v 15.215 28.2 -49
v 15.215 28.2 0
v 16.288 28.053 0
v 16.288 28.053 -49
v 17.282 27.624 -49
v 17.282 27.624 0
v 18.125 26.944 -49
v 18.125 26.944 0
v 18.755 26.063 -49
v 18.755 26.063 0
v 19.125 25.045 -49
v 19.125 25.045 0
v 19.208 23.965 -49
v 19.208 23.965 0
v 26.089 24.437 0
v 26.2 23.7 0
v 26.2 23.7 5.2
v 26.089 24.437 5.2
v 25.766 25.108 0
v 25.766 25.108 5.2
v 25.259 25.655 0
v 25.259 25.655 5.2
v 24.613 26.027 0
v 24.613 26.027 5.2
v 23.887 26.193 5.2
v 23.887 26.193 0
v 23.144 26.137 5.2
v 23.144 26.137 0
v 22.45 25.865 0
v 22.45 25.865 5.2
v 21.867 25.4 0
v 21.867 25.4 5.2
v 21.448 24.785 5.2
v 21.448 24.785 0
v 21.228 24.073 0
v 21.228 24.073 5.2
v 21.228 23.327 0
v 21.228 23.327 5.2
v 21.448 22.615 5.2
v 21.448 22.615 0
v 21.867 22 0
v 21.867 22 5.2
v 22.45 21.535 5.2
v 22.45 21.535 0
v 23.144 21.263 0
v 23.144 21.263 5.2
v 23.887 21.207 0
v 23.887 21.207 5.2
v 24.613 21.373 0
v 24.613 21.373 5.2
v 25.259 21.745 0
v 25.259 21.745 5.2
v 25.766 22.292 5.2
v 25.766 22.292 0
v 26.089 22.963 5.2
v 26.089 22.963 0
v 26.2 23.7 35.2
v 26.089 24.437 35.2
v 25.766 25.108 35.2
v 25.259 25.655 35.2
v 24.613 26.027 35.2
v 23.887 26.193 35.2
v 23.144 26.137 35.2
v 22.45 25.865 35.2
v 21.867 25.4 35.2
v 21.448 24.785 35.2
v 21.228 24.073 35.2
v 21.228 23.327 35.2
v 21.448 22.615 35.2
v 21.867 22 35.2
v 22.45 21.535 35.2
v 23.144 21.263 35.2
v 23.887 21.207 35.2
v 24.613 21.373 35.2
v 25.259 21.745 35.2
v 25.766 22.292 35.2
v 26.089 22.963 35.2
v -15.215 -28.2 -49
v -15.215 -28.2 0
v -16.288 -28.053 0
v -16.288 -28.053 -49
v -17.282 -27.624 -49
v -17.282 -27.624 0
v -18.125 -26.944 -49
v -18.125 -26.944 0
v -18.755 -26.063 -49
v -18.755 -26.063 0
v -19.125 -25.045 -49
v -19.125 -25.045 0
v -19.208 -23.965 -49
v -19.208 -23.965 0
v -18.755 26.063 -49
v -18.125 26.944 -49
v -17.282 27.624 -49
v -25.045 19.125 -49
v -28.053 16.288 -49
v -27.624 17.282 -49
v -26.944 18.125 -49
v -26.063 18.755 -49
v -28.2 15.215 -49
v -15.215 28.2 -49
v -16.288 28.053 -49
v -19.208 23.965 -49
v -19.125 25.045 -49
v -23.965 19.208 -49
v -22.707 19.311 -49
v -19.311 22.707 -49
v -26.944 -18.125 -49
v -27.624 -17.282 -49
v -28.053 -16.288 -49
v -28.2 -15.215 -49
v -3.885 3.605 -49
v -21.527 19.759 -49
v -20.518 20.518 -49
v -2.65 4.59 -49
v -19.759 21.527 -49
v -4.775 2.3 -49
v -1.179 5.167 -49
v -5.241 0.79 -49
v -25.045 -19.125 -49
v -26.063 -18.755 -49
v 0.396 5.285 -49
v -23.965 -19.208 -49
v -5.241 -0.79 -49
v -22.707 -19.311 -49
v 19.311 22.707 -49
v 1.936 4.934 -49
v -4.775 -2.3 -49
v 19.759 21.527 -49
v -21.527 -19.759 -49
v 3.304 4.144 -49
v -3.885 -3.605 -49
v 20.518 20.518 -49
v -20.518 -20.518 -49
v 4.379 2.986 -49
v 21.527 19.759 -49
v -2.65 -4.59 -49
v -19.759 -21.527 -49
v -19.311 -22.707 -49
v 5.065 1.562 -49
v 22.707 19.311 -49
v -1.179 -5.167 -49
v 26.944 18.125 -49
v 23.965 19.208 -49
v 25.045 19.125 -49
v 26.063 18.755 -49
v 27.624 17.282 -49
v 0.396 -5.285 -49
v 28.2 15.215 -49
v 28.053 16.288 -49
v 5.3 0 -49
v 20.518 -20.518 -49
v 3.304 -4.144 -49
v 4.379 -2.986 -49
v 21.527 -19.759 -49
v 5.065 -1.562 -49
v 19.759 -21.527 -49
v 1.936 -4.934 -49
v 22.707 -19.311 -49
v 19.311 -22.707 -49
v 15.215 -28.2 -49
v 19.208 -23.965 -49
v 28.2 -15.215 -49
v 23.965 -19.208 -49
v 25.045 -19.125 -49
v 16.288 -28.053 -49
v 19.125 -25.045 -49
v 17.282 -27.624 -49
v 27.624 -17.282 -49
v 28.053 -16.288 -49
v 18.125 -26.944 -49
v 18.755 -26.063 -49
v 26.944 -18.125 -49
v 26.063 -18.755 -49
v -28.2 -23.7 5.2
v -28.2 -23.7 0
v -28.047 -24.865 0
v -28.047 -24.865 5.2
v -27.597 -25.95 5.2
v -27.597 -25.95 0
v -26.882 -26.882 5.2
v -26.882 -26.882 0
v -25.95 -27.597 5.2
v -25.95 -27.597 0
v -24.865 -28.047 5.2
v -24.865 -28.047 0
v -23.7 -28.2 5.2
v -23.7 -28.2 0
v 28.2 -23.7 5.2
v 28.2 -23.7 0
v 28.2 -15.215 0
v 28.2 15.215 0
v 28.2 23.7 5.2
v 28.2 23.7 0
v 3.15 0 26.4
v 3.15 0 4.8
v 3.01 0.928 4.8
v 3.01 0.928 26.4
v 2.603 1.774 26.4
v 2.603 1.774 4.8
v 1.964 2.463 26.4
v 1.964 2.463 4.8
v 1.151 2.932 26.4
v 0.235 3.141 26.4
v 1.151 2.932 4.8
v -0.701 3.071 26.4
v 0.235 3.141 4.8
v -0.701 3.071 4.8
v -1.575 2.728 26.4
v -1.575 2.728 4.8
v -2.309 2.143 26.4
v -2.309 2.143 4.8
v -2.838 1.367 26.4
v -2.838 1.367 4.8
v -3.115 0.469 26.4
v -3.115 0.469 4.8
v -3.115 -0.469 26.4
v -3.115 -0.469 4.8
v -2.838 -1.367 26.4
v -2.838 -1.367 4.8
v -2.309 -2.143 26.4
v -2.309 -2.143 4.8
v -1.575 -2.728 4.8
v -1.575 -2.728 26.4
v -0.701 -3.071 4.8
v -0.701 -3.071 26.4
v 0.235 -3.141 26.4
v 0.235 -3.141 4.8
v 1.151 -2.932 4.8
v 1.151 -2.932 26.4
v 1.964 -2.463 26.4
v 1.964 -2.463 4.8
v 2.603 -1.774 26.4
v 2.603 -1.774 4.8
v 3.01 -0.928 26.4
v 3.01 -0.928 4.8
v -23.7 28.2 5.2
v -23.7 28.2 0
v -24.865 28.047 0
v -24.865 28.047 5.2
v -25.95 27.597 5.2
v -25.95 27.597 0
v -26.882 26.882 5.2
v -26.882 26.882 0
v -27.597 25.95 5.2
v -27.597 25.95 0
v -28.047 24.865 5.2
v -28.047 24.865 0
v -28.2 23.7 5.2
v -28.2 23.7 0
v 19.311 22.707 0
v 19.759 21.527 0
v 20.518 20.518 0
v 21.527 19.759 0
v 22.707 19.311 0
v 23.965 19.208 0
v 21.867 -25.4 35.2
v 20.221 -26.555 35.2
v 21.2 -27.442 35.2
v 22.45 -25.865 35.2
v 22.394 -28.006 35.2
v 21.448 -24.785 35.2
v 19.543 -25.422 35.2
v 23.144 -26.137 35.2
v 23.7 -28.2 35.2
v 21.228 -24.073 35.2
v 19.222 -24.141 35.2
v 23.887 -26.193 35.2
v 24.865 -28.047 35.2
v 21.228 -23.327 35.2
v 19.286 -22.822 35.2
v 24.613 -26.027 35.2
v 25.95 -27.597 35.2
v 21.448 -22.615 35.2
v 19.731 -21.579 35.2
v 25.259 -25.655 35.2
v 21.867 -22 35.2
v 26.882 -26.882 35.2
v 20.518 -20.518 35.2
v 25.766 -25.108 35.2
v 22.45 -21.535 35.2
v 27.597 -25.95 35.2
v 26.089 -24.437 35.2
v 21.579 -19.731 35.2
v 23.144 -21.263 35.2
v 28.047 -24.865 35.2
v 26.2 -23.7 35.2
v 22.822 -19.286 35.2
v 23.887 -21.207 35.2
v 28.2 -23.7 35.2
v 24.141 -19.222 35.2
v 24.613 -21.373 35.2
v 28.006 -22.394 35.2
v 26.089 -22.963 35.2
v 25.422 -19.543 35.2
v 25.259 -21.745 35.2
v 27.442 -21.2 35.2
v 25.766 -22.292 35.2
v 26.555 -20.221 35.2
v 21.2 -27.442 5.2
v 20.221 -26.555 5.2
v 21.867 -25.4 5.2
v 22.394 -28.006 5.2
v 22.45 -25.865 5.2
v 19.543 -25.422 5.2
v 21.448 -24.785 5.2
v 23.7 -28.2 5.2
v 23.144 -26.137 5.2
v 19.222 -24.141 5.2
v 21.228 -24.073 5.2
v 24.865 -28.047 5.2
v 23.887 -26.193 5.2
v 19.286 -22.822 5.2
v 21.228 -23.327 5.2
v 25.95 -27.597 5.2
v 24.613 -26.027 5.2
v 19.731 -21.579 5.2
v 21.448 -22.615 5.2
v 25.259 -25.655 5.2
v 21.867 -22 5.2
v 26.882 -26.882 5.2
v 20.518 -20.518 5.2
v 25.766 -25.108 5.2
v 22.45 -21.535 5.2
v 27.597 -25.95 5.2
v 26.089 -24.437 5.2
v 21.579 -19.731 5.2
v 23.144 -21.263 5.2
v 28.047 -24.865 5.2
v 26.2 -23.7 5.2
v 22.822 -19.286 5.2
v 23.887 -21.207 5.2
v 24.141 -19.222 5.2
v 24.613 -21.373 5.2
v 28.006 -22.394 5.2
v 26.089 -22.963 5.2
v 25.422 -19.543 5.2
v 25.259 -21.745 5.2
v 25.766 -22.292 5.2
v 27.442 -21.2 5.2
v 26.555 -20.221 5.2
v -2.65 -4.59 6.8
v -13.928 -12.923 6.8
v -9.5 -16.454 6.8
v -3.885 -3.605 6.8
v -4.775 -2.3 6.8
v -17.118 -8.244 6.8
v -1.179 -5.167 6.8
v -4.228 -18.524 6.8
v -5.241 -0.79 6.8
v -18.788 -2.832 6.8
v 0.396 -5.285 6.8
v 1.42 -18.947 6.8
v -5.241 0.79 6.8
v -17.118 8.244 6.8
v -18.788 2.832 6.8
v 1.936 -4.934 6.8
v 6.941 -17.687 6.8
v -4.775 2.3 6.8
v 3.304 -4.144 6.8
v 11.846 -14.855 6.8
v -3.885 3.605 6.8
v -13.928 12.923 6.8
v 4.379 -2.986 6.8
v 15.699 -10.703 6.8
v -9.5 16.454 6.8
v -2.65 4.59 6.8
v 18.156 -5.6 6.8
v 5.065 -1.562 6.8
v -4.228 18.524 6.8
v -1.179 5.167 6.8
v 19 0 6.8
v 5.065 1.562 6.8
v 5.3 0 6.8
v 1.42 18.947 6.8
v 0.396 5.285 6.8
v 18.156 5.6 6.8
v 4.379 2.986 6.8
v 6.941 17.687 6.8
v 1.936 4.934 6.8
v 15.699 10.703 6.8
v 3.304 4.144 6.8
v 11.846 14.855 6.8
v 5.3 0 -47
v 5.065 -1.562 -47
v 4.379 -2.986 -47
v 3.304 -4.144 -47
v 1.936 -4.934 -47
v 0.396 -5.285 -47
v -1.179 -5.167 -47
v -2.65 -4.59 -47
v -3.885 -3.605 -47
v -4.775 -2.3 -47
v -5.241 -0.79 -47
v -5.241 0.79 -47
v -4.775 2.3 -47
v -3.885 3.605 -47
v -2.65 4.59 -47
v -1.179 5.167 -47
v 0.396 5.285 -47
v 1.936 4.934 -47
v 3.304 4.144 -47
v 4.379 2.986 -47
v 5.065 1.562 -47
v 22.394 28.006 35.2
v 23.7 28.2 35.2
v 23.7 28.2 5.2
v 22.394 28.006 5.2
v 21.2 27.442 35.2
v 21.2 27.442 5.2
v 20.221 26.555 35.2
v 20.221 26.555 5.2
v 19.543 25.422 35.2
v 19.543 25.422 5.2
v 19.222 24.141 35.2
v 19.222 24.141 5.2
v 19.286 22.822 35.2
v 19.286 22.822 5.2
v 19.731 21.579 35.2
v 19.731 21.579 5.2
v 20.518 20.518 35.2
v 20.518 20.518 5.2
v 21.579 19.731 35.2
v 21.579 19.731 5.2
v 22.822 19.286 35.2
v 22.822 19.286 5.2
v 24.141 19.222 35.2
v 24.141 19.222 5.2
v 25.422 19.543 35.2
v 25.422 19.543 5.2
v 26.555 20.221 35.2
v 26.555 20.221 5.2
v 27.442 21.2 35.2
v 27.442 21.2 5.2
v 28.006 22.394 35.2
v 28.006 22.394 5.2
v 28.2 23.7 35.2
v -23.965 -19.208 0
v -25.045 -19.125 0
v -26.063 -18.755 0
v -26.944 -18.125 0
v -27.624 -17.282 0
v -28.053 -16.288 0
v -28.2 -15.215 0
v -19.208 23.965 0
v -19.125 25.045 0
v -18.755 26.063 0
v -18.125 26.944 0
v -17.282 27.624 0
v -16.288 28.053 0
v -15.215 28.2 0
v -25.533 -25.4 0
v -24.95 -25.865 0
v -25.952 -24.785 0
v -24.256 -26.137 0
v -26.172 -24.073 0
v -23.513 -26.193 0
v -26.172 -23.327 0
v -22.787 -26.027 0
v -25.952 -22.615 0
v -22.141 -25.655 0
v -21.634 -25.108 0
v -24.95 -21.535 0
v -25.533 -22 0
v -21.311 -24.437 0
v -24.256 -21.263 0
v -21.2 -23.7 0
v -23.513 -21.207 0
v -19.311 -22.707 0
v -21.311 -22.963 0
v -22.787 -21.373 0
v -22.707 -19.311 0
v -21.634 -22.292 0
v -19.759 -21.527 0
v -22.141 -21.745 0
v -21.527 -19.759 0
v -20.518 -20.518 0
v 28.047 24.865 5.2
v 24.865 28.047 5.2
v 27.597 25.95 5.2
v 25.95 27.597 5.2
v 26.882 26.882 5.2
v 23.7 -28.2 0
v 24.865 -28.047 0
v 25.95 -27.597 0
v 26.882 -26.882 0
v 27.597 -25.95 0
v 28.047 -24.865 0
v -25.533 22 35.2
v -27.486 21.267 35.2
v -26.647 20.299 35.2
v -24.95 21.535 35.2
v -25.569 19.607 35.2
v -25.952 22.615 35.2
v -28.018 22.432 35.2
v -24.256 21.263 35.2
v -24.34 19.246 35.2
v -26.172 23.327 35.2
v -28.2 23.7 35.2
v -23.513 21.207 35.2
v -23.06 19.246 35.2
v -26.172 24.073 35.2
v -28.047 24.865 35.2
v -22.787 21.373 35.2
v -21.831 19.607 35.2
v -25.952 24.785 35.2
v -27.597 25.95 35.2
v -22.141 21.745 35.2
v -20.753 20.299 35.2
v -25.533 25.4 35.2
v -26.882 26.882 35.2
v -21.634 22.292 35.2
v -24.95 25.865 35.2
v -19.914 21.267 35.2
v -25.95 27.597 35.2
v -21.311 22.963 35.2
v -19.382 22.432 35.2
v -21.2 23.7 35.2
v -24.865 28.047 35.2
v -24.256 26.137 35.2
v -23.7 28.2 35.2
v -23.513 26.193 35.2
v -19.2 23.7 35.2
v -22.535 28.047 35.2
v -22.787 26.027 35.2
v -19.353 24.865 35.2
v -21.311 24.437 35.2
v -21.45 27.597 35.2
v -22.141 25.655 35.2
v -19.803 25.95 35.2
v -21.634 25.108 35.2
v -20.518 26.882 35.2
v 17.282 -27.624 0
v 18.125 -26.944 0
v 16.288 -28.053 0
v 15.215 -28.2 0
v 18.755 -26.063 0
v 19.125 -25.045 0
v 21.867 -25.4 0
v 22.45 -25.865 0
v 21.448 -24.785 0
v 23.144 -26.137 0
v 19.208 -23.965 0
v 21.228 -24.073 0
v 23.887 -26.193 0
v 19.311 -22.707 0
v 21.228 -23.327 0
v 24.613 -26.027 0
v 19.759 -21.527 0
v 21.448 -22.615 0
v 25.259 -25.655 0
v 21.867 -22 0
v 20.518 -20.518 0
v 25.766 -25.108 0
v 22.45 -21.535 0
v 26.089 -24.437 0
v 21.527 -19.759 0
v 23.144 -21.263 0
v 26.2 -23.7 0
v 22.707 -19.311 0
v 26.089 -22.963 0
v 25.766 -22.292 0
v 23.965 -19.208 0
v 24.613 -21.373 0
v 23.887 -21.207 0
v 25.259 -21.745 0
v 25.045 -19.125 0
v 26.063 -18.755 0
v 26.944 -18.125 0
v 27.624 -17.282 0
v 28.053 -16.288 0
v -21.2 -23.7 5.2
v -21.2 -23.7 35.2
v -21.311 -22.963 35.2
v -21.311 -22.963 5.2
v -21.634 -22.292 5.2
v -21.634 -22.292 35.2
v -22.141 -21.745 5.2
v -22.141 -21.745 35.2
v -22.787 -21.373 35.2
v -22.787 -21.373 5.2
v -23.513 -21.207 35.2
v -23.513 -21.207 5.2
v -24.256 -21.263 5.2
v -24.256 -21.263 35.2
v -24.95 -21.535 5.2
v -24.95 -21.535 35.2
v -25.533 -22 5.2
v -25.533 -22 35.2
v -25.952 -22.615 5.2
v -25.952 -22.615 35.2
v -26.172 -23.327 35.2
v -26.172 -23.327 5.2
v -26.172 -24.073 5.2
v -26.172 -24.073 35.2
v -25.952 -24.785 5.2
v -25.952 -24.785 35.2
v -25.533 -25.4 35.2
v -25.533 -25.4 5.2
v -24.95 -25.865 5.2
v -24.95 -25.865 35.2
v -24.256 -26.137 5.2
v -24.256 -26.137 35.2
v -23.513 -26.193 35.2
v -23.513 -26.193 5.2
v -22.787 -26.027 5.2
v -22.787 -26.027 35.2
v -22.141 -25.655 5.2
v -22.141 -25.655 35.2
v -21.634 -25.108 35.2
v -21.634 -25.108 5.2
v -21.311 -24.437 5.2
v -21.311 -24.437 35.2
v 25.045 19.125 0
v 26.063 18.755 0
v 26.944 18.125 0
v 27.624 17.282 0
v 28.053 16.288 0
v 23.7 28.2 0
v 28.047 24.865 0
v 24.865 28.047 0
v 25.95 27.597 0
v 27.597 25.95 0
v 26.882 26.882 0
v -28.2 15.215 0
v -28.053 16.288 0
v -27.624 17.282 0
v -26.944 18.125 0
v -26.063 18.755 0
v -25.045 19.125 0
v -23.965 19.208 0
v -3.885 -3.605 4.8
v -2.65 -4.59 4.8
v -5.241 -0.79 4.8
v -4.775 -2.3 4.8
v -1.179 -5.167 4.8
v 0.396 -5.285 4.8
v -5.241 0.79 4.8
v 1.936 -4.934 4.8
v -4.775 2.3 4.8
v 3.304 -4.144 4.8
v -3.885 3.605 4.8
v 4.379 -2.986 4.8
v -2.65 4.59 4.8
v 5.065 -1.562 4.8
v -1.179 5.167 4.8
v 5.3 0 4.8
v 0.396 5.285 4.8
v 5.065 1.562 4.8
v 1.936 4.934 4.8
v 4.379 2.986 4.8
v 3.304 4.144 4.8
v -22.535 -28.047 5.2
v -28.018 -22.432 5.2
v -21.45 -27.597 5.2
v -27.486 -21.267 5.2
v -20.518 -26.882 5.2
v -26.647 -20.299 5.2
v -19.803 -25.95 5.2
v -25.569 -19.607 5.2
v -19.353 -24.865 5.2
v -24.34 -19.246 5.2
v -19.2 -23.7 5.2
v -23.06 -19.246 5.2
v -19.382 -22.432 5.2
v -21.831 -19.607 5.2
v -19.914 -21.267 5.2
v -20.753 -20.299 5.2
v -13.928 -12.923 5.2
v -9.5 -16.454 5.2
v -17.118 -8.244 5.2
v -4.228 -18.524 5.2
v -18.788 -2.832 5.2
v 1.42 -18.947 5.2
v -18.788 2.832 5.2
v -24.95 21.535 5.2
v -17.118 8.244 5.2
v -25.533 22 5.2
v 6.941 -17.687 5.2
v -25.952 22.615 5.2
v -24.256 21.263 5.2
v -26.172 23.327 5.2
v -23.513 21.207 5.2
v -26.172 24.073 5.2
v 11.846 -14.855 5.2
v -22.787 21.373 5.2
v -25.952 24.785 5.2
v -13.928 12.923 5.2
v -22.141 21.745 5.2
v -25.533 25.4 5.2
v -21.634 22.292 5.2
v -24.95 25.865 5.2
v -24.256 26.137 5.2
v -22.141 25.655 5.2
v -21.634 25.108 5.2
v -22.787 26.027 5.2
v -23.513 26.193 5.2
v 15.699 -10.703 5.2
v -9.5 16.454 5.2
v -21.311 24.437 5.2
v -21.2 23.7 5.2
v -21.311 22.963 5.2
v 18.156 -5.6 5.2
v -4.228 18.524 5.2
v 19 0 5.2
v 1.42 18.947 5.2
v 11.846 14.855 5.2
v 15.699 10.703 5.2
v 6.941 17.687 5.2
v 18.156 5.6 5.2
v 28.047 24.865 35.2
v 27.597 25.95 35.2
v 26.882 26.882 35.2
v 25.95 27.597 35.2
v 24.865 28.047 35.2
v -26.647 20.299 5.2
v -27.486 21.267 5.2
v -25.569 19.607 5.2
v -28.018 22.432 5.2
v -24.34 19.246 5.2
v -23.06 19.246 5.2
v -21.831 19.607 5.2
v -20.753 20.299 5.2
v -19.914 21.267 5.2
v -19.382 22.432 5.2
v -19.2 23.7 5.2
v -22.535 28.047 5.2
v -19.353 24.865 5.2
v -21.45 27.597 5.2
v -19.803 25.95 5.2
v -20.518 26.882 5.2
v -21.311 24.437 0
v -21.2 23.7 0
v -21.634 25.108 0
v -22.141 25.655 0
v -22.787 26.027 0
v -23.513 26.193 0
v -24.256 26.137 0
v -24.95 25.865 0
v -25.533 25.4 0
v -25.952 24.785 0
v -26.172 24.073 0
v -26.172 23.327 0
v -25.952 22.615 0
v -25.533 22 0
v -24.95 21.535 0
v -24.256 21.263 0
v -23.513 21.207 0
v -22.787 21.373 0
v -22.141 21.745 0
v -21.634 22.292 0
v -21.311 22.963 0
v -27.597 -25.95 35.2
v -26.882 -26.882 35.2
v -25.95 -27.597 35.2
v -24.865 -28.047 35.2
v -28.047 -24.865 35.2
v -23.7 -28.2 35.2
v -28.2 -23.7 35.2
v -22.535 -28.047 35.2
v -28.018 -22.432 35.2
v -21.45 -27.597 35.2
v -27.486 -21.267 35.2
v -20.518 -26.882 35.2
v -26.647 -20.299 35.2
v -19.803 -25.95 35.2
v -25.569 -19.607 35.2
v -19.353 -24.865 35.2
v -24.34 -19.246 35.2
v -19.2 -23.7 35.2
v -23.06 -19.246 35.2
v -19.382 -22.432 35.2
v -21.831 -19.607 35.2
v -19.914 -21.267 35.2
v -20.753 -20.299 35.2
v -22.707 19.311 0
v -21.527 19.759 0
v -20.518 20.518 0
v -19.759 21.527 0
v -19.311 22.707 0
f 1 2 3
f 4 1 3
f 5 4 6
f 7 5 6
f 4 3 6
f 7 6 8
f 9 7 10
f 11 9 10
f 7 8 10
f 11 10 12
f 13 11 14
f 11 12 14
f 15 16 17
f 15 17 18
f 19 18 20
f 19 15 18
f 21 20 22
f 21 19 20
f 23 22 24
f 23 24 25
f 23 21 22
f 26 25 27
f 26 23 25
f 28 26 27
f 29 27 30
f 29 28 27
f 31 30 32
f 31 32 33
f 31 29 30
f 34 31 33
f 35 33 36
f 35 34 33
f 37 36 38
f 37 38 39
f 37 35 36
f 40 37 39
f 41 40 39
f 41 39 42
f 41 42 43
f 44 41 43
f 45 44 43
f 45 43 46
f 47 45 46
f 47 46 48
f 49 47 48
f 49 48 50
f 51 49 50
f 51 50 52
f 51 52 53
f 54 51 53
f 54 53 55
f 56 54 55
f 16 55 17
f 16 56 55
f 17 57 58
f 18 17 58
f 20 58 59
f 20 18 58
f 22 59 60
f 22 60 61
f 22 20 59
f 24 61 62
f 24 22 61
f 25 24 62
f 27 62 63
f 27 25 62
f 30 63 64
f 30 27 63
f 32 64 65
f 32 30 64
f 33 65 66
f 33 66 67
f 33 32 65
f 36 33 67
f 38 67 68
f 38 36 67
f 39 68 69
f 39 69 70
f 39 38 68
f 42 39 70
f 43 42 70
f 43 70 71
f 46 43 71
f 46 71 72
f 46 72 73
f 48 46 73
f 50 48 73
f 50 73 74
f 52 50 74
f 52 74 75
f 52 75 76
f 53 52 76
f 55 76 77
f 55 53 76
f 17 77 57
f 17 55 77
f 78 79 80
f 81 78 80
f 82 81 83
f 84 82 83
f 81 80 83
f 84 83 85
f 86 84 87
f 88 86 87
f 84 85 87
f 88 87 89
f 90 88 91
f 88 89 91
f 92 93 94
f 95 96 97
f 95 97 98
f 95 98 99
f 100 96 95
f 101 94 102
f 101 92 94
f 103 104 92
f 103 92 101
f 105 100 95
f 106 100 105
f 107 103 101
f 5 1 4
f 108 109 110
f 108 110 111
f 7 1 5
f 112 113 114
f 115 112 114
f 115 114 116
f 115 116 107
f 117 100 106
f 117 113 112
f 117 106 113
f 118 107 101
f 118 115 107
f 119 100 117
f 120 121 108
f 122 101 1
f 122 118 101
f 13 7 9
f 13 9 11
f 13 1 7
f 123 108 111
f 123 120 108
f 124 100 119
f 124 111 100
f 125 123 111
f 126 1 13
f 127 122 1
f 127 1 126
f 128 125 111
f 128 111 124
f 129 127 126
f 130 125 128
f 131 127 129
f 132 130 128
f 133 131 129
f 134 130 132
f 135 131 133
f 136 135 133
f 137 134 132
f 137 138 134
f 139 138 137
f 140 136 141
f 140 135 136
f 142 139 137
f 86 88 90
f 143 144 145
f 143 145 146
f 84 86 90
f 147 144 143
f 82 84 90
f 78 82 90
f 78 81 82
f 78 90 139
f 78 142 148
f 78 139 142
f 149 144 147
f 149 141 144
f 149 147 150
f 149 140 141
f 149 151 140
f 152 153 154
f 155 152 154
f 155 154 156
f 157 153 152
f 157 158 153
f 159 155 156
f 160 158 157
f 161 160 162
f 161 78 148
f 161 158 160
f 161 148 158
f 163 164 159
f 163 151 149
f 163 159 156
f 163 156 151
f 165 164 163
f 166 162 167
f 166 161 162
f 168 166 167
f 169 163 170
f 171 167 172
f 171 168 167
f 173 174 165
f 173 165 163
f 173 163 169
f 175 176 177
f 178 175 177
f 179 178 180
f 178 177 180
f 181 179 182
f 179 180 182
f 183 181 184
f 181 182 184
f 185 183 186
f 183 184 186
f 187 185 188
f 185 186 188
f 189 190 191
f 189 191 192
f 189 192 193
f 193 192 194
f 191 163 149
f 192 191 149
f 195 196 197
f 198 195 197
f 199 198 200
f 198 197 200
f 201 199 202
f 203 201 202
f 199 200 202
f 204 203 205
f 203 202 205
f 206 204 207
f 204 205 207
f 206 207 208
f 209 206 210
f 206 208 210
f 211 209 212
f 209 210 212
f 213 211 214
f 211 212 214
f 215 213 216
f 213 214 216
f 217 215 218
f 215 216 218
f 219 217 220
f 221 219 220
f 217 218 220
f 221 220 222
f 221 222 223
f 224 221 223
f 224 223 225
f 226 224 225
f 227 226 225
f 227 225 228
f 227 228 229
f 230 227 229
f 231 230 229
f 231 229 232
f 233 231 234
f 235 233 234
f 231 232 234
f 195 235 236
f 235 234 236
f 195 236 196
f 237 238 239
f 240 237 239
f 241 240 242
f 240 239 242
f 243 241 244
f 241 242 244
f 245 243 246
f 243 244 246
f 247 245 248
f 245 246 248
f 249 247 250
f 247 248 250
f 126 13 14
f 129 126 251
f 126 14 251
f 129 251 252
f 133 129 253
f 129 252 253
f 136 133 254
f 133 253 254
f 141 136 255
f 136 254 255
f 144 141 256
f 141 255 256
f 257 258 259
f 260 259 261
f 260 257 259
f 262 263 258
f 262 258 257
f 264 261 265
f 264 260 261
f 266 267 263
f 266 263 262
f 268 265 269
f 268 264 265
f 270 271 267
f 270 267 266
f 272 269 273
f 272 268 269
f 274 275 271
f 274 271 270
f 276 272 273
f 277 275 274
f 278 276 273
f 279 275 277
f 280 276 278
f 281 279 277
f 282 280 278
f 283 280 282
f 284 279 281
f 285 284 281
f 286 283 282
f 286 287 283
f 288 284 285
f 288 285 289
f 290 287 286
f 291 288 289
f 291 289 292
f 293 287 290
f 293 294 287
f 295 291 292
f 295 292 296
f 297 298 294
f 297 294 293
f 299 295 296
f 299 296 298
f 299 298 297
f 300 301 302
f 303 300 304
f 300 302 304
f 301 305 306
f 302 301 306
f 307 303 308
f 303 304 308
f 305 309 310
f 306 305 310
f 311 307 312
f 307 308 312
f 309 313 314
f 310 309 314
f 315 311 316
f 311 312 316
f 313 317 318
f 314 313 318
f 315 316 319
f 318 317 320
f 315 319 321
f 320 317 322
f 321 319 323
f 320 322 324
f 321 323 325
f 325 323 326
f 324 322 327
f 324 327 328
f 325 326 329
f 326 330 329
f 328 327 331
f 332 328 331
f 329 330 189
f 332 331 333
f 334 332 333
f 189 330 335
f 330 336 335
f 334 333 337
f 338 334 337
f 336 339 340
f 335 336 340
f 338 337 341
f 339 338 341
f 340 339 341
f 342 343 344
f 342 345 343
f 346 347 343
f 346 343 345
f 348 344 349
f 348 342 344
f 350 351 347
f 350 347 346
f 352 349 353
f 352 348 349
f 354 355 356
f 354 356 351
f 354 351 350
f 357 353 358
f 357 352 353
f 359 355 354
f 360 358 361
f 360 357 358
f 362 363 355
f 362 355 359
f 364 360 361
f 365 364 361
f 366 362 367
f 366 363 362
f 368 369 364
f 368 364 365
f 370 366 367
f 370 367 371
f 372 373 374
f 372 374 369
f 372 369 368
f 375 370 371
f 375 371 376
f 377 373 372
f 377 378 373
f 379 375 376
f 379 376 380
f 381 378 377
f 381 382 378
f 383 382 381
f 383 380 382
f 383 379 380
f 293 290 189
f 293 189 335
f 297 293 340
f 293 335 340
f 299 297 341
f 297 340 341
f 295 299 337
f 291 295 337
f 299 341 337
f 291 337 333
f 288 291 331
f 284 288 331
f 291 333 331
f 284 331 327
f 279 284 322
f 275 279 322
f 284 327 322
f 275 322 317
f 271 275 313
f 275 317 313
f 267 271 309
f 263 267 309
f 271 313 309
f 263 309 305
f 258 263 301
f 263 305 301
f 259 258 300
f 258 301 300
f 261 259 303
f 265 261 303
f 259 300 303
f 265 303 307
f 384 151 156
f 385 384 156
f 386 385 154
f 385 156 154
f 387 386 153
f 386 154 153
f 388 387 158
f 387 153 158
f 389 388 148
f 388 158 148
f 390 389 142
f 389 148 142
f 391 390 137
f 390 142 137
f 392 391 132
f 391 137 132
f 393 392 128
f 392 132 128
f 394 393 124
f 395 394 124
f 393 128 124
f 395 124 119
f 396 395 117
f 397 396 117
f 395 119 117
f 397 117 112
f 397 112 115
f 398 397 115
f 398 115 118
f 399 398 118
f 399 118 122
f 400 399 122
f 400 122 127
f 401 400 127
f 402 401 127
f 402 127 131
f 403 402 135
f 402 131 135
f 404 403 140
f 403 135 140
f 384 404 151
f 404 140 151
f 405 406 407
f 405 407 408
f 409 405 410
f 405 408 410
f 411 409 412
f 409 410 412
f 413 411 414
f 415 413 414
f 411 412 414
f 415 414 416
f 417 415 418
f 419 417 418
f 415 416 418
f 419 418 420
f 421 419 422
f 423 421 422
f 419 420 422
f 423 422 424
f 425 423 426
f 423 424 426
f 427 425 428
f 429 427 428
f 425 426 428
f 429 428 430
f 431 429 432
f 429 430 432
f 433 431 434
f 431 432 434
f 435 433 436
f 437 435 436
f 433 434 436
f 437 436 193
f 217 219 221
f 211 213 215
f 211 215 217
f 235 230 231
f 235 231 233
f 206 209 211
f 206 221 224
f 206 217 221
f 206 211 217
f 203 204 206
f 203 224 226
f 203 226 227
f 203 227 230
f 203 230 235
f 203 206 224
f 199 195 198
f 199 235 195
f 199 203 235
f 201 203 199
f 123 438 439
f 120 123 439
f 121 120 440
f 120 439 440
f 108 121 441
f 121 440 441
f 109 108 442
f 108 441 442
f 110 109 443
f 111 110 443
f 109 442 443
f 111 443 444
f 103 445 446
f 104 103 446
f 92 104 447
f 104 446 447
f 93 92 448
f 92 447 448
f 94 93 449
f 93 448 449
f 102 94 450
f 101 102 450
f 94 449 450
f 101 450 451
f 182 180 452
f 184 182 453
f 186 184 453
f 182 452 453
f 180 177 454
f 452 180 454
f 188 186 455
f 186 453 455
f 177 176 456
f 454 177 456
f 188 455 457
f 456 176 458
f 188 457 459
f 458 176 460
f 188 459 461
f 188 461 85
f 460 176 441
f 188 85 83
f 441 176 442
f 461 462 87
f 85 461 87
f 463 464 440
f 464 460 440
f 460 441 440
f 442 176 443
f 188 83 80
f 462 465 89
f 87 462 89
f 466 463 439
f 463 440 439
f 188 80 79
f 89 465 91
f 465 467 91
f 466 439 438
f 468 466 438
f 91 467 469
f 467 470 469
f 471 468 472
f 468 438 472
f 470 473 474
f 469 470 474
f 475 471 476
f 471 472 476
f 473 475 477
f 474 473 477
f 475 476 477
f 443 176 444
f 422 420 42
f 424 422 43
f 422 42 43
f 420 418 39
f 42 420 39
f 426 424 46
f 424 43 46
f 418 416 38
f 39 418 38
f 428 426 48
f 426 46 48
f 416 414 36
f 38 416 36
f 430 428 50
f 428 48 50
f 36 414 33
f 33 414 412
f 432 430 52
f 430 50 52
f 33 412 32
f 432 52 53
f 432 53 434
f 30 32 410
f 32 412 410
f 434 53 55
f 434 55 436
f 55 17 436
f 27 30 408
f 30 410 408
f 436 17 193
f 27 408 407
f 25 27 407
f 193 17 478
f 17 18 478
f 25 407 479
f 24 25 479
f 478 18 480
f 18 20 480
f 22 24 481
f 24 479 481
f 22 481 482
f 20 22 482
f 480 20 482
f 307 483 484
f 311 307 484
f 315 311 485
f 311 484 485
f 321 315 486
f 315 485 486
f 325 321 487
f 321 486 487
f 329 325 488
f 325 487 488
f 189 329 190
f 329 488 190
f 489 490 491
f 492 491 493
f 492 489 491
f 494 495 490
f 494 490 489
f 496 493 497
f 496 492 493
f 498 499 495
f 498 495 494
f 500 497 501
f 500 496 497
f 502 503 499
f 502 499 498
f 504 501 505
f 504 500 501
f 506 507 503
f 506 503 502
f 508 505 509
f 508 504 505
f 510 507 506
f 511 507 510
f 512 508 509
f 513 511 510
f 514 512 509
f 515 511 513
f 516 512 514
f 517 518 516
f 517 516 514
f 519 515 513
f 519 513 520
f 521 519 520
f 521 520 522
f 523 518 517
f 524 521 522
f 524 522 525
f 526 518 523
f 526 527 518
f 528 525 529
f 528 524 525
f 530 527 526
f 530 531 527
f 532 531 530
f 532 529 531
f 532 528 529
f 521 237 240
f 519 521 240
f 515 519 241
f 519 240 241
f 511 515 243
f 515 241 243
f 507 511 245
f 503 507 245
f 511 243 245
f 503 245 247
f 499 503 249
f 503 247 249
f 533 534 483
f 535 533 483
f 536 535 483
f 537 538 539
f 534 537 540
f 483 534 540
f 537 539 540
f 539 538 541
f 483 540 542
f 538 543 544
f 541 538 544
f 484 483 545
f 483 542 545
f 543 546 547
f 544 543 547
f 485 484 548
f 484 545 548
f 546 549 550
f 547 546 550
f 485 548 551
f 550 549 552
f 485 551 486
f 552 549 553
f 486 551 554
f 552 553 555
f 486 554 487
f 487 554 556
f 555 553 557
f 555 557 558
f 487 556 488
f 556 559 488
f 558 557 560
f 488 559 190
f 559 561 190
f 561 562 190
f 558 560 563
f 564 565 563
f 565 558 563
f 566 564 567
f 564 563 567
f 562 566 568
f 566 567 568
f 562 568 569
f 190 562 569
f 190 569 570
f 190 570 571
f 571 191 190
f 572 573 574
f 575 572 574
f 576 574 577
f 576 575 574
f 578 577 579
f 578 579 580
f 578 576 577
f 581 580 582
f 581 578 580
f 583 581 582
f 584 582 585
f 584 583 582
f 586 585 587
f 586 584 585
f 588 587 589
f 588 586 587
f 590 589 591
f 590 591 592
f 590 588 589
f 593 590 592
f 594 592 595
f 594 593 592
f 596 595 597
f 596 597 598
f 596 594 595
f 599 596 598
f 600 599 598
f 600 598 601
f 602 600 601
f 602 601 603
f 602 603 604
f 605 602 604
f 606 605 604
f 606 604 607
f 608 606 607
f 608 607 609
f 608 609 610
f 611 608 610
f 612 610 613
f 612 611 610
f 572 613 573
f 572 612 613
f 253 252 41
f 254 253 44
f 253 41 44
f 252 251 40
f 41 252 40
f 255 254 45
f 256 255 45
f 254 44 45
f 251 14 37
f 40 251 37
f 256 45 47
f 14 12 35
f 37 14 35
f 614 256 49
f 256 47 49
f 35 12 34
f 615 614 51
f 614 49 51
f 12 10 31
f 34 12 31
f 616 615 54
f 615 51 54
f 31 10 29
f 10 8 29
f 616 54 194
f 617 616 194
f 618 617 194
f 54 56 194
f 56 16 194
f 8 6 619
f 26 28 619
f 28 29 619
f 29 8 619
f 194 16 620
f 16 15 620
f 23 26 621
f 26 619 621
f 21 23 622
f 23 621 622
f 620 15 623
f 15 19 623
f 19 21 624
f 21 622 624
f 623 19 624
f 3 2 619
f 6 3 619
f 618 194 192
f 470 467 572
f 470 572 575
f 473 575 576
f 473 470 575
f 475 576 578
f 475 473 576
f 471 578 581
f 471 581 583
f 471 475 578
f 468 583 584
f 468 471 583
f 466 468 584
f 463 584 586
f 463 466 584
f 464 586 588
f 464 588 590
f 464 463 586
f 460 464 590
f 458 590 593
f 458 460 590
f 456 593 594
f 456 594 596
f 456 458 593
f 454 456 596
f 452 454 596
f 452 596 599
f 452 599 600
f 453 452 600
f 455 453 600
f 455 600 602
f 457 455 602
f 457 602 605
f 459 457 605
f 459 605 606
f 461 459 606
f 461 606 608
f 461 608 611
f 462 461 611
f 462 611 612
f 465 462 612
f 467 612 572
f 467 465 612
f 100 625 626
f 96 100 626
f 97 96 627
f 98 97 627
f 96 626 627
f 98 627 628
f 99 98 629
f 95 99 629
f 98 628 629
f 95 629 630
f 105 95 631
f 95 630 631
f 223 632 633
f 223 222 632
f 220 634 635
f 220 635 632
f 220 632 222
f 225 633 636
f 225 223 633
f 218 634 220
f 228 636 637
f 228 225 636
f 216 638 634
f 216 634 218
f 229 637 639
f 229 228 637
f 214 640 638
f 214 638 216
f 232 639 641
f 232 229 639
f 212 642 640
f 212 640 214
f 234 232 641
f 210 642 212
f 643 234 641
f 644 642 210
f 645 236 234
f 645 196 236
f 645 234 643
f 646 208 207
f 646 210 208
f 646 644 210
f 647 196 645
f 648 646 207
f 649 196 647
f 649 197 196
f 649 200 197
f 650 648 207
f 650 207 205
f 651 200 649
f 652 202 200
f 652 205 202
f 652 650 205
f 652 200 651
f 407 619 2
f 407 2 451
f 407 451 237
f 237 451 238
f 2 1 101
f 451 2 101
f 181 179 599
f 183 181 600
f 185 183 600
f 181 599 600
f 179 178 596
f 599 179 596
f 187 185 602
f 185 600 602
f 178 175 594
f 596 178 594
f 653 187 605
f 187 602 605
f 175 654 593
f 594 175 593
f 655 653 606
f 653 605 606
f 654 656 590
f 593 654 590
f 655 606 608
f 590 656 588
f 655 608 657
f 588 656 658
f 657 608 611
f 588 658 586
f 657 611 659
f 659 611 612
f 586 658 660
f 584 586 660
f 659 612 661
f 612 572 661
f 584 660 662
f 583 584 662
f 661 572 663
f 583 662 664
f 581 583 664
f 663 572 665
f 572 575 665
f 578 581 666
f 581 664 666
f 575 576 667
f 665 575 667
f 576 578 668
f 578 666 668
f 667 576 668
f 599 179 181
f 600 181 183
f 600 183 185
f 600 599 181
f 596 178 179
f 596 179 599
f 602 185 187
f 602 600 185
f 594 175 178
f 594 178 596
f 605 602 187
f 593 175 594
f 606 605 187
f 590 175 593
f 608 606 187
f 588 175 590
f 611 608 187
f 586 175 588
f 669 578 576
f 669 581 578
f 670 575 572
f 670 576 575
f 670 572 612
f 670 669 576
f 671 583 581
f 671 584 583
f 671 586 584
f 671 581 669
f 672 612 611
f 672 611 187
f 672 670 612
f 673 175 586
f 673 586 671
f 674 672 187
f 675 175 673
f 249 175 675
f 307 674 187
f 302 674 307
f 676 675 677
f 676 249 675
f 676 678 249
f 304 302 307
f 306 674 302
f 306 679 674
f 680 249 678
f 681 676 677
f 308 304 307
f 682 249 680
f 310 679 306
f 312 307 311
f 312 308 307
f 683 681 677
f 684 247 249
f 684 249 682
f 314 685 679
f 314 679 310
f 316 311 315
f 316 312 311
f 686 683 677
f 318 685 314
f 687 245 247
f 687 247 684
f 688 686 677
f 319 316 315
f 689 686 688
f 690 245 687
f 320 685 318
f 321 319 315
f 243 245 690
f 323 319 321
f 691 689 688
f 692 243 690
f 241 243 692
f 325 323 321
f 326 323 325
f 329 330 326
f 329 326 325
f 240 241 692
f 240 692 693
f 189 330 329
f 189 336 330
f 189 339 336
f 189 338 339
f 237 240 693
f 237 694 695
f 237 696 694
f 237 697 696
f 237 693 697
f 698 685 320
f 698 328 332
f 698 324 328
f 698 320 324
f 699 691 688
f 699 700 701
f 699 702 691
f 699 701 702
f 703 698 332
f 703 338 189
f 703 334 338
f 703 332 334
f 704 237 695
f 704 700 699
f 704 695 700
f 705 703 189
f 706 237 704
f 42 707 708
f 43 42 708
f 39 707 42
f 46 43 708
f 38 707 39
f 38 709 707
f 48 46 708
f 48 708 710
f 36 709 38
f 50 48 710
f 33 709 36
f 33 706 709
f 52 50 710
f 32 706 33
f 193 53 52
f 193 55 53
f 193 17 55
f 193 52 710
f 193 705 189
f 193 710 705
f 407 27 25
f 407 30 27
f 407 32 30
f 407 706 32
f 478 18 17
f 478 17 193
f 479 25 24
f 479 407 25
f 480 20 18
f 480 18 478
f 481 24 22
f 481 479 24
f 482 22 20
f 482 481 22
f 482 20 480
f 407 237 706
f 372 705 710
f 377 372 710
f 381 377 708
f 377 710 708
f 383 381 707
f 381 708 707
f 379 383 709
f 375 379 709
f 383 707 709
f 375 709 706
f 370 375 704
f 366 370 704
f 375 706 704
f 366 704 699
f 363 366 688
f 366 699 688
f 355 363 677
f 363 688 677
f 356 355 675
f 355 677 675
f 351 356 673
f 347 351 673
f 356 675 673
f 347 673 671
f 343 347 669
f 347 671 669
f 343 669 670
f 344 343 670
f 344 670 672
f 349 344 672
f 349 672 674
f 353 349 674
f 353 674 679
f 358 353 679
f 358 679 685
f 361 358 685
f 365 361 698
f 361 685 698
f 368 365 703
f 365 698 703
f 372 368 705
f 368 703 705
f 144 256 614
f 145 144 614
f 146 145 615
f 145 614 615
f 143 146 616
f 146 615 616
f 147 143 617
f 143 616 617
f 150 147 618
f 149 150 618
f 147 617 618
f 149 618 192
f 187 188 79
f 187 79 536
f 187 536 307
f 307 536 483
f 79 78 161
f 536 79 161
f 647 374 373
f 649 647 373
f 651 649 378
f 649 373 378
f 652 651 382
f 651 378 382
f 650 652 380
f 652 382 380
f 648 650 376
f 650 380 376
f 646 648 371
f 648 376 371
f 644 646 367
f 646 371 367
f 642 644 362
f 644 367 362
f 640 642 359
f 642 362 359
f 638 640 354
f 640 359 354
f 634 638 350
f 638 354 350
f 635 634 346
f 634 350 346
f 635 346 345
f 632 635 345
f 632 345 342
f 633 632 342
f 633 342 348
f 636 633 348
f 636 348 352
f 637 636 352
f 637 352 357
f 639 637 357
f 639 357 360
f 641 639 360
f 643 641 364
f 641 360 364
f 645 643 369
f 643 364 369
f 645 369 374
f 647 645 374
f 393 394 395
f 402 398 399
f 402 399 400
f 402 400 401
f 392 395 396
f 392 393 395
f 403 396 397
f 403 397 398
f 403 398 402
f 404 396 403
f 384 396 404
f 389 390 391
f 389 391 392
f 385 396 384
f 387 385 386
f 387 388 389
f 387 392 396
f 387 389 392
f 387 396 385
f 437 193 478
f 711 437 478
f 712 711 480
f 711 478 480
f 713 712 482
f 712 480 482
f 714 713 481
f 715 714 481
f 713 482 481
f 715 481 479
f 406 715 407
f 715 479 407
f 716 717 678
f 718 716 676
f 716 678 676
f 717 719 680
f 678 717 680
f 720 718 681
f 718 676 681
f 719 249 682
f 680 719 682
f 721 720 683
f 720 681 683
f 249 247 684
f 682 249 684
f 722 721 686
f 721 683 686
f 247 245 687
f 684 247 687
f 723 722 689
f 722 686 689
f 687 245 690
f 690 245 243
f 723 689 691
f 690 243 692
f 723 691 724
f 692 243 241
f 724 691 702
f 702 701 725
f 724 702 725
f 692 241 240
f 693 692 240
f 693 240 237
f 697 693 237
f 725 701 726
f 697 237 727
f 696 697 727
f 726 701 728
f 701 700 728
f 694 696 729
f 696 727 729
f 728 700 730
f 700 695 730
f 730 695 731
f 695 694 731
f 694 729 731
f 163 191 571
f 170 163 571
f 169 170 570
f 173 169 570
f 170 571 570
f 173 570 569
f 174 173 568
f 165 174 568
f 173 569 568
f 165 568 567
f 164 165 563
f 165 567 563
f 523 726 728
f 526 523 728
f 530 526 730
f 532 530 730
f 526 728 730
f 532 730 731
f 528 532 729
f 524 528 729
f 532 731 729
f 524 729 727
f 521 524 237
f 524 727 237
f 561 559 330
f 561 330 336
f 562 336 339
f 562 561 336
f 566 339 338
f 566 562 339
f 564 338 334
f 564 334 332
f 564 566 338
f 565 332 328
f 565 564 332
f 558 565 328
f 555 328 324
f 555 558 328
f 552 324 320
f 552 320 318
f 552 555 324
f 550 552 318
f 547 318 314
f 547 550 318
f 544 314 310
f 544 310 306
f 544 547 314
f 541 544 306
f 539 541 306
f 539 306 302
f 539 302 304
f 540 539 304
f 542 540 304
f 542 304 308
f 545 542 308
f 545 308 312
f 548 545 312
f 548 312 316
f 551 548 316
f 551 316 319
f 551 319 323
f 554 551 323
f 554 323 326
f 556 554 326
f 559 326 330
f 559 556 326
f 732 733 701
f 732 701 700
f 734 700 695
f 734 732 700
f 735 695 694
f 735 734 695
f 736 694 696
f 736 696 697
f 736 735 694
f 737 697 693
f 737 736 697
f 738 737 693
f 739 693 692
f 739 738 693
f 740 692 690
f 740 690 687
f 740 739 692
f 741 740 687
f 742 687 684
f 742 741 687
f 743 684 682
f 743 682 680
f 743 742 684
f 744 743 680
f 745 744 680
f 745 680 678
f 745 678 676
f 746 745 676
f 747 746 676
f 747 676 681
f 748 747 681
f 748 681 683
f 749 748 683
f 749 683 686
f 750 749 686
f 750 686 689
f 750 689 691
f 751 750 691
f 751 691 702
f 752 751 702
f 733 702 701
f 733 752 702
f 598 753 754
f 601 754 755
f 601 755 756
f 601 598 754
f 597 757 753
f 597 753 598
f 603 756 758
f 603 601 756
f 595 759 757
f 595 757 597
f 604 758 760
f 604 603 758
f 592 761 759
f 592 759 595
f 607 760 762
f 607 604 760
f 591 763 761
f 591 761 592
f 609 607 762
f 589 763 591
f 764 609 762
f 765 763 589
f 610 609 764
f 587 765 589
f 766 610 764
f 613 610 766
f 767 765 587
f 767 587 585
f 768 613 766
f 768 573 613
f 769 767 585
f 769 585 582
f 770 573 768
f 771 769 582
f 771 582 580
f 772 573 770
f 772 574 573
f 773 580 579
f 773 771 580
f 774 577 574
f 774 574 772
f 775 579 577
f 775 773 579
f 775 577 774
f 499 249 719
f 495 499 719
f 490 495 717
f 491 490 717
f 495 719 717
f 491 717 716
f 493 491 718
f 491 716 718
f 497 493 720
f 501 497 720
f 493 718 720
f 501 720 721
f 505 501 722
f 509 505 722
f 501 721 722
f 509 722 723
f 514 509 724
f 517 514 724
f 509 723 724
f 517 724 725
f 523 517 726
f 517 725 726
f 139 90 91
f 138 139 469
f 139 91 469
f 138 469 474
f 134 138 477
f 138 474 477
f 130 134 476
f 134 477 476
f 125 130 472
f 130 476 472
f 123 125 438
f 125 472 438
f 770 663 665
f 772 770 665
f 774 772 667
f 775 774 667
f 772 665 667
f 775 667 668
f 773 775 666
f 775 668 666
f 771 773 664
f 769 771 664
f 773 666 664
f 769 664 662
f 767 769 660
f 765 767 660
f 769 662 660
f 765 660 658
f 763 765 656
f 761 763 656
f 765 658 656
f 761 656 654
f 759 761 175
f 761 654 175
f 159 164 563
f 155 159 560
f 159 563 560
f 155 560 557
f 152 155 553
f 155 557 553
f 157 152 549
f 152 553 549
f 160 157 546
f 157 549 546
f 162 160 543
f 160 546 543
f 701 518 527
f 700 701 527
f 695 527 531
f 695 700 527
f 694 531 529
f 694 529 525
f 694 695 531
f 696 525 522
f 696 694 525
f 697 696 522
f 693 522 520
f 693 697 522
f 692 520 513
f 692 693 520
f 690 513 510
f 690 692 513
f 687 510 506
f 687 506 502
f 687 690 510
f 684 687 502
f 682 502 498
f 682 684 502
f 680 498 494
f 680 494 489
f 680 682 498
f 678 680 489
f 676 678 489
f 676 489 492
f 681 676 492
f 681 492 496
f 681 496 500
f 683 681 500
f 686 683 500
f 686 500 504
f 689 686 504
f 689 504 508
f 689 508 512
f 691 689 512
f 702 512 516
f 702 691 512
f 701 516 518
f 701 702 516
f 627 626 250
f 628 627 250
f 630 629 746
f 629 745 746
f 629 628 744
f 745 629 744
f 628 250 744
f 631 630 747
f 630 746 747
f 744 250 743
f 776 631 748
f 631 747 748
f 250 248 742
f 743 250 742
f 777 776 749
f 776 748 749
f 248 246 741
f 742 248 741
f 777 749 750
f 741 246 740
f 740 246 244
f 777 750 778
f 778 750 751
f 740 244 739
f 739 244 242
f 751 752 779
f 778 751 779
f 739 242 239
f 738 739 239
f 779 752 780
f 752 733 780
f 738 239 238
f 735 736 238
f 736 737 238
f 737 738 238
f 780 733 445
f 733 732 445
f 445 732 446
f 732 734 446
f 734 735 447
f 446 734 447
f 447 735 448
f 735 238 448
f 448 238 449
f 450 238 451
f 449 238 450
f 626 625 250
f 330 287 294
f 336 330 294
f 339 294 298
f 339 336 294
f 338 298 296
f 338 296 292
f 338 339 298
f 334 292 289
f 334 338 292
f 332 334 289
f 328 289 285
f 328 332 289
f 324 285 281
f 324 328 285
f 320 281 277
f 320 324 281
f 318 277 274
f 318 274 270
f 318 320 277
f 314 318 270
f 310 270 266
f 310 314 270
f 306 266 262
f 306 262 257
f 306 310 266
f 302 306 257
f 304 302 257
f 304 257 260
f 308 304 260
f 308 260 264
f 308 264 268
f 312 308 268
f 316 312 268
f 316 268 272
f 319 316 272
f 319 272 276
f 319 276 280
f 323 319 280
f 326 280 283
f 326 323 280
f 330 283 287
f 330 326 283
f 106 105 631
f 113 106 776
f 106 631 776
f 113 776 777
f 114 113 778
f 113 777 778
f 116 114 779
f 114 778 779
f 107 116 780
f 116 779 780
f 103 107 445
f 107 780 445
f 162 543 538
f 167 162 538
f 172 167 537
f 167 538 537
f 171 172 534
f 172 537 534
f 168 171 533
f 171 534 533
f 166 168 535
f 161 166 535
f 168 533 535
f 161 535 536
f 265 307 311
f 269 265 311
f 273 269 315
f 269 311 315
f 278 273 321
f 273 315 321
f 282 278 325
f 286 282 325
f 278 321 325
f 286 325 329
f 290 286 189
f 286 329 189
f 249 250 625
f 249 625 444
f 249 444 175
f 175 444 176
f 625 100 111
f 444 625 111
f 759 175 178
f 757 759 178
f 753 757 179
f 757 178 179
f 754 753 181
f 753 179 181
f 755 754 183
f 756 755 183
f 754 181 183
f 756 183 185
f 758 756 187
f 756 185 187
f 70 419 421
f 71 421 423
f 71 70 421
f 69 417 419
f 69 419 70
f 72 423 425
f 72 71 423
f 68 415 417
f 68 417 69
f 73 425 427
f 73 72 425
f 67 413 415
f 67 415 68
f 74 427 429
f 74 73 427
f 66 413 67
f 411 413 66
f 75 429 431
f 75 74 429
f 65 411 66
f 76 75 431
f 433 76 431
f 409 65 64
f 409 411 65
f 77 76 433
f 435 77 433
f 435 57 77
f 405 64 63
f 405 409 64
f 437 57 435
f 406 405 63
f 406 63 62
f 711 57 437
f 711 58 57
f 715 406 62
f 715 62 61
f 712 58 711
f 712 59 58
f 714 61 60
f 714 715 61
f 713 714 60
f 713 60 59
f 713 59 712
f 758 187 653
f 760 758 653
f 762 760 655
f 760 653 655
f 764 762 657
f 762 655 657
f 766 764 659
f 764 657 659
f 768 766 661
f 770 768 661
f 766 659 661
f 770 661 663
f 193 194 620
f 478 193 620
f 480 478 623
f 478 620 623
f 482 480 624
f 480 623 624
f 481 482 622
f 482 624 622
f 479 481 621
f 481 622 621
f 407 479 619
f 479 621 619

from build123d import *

# Parameters (mm, degrees)
F0_R      = 2.5
F1_DEPTH  = 5.2
F3_DEPTH  = 49
F4_R      = 19
F5_DEPTH  = 1.6
F6_R      = 5.3
F8_DEPTH  = 2
F9_R      = 3.15
F10_DEPTH = 21.6
F7_R      = 5.3
F11_DEPTH = 2
F12_R     = 2.5
F13_DEPTH = 30


with BuildPart() as f1:
    # F0 (on Top) → F1 (new body)
    with BuildSketch(Plane.XY):
        with BuildLine():
            Line((23.7, 28.2), (-23.7, 28.2))
            ThreePointArc((-23.7, 28.2), (-26.8819805153, 26.8819805153), (-28.2, 23.7))
            Line((-28.2, 23.7), (-28.2, -23.7))
            ThreePointArc((-28.2, -23.7), (-26.8819805153, -26.8819805153), (-23.7, -28.2))
            Line((-23.7, -28.2), (23.7, -28.2))
            ThreePointArc((23.7, -28.2), (26.8819805153, -26.8819805153), (28.2, -23.7))
            Line((28.2, -23.7), (28.2, 23.7))
            ThreePointArc((28.2, 23.7), (26.8819805153, 26.8819805153), (23.7, 28.2))
        make_face()
        with Locations((-23.7, -23.7)):
            Circle(F0_R, mode=Mode.SUBTRACT)
        with Locations((23.7, -23.7)):
            Circle(F0_R, mode=Mode.SUBTRACT)
        with Locations((-23.7, 23.7)):
            Circle(F0_R, mode=Mode.SUBTRACT)
        with Locations((23.7, 23.7)):
            Circle(F0_R, mode=Mode.SUBTRACT)
    extrude(amount=F1_DEPTH)

    # F2 (on face) → F3 (join)
    with BuildSketch(Plane(origin=(0, 0, 0), x_dir=(1, 0, 0), z_dir=(0, 0, -1))):
        with BuildLine():
            ThreePointArc((-19.2077922136, -23.9647058824), (-18.1251461262, -26.9439773623), (-15.2147186258, -28.2))
            Line((-15.2147186258, -28.2), (15.2147186258, -28.2))
            ThreePointArc((15.2147186258, -28.2), (18.1251461262, -26.9439773623), (19.2077922136, -23.9647058824))
            ThreePointArc((19.2077922136, -23.9647058824), (20.5180194847, -20.5180194847), (23.9647058824, -19.2077922136))
            ThreePointArc((23.9647058824, -19.2077922136), (26.9439773623, -18.1251461262), (28.2, -15.2147186258))
            Line((28.2, -15.2147186258), (28.2, 15.2147186258))
            ThreePointArc((28.2, 15.2147186258), (26.9439773623, 18.1251461262), (23.9647058824, 19.2077922136))
            ThreePointArc((23.9647058824, 19.2077922136), (20.5180194847, 20.5180194847), (19.2077922136, 23.9647058824))
            ThreePointArc((19.2077922136, 23.9647058824), (18.1251461262, 26.9439773623), (15.2147186258, 28.2))
            Line((15.2147186258, 28.2), (-15.2147186258, 28.2))
            ThreePointArc((-15.2147186258, 28.2), (-18.1251461262, 26.9439773623), (-19.2077922136, 23.9647058824))
            ThreePointArc((-19.2077922136, 23.9647058824), (-20.5180194847, 20.5180194847), (-23.9647058824, 19.2077922136))
            ThreePointArc((-23.9647058824, 19.2077922136), (-26.9439773623, 18.1251461262), (-28.2, 15.2147186258))
            Line((-28.2, 15.2147186258), (-28.2, -15.2147186258))
            ThreePointArc((-28.2, -15.2147186258), (-26.9439773623, -18.1251461262), (-23.9647058824, -19.2077922136))
            ThreePointArc((-23.9647058824, -19.2077922136), (-20.5180194847, -20.5180194847), (-19.2077922136, -23.9647058824))
        make_face()
    extrude(amount=F3_DEPTH)

    # F4 (on face) → F5 (join)
    with BuildSketch(Plane.XY.offset(5.2)):
        Circle(F4_R)
    extrude(amount=F5_DEPTH)

    # F6 (on face) → F8 (cut)
    with BuildSketch(Plane.XY.offset(6.8)):
        Circle(F6_R)
    extrude(amount=-F8_DEPTH, mode=Mode.SUBTRACT)

    # F9 (on face) → F10 (join)
    with BuildSketch(Plane.XY.offset(4.8)):
        Circle(F9_R)
    extrude(amount=F10_DEPTH)

    # F7 (on face) → F11 (cut)
    with BuildSketch(Plane(origin=(0, 0, -49), x_dir=(1, 0, 0), z_dir=(0, 0, -1))):
        Circle(F7_R)
    extrude(amount=-F11_DEPTH, mode=Mode.SUBTRACT)


with BuildPart() as f13:
    # F12 (on face) → F13 (new body)
    with BuildSketch(Plane.XY.offset(5.2)):
        with BuildLine():
            ThreePointArc((23.7, -28.2), (26.8819805153, -26.8819805153), (28.2, -23.7))
            ThreePointArc((28.2, -23.7), (20.5180194847, -20.5180194847), (23.7, -28.2))
        make_face()
        with Locations((23.7, -23.7)):
            Circle(F12_R, mode=Mode.SUBTRACT)
    extrude(amount=F13_DEPTH)


with BuildPart() as f13b:
    # F12 (on face) → F13, piece 2 (new body)
    with BuildSketch(Plane.XY.offset(5.2)):
        with BuildLine():
            ThreePointArc((-19.2, -23.7), (-23.7, -19.2), (-28.2, -23.7))
            ThreePointArc((-28.2, -23.7), (-26.8819805153, -26.8819805153), (-23.7, -28.2))
            ThreePointArc((-23.7, -28.2), (-20.5180194847, -26.8819805153), (-19.2, -23.7))
        make_face()
        with Locations((-23.7, -23.7)):
            Circle(F12_R, mode=Mode.SUBTRACT)
    extrude(amount=F13_DEPTH)


with BuildPart() as f13c:
    # F12 (on face) → F13, piece 3 (new body)
    with BuildSketch(Plane.XY.offset(5.2)):
        with BuildLine():
            ThreePointArc((-28.2, 23.7), (-23.7, 19.2), (-19.2, 23.7))
            ThreePointArc((-19.2, 23.7), (-20.5180194847, 26.8819805153), (-23.7, 28.2))
            ThreePointArc((-23.7, 28.2), (-26.8819805153, 26.8819805153), (-28.2, 23.7))
        make_face()
        with Locations((-23.7, 23.7)):
            Circle(F12_R, mode=Mode.SUBTRACT)
    extrude(amount=F13_DEPTH)


with BuildPart() as f13d:
    # F12 (on face) → F13, piece 4 (new body)
    with BuildSketch(Plane.XY.offset(5.2)):
        with BuildLine():
            ThreePointArc((28.2, 23.7), (26.8819805153, 26.8819805153), (23.7, 28.2))
            ThreePointArc((23.7, 28.2), (20.5180194847, 20.5180194847), (28.2, 23.7))
        make_face()
        with Locations((23.7, 23.7)):
            Circle(F12_R, mode=Mode.SUBTRACT)
    extrude(amount=F13_DEPTH)


solid = Compound([f1.part, f13.part, f13b.part, f13c.part, f13d.part])
